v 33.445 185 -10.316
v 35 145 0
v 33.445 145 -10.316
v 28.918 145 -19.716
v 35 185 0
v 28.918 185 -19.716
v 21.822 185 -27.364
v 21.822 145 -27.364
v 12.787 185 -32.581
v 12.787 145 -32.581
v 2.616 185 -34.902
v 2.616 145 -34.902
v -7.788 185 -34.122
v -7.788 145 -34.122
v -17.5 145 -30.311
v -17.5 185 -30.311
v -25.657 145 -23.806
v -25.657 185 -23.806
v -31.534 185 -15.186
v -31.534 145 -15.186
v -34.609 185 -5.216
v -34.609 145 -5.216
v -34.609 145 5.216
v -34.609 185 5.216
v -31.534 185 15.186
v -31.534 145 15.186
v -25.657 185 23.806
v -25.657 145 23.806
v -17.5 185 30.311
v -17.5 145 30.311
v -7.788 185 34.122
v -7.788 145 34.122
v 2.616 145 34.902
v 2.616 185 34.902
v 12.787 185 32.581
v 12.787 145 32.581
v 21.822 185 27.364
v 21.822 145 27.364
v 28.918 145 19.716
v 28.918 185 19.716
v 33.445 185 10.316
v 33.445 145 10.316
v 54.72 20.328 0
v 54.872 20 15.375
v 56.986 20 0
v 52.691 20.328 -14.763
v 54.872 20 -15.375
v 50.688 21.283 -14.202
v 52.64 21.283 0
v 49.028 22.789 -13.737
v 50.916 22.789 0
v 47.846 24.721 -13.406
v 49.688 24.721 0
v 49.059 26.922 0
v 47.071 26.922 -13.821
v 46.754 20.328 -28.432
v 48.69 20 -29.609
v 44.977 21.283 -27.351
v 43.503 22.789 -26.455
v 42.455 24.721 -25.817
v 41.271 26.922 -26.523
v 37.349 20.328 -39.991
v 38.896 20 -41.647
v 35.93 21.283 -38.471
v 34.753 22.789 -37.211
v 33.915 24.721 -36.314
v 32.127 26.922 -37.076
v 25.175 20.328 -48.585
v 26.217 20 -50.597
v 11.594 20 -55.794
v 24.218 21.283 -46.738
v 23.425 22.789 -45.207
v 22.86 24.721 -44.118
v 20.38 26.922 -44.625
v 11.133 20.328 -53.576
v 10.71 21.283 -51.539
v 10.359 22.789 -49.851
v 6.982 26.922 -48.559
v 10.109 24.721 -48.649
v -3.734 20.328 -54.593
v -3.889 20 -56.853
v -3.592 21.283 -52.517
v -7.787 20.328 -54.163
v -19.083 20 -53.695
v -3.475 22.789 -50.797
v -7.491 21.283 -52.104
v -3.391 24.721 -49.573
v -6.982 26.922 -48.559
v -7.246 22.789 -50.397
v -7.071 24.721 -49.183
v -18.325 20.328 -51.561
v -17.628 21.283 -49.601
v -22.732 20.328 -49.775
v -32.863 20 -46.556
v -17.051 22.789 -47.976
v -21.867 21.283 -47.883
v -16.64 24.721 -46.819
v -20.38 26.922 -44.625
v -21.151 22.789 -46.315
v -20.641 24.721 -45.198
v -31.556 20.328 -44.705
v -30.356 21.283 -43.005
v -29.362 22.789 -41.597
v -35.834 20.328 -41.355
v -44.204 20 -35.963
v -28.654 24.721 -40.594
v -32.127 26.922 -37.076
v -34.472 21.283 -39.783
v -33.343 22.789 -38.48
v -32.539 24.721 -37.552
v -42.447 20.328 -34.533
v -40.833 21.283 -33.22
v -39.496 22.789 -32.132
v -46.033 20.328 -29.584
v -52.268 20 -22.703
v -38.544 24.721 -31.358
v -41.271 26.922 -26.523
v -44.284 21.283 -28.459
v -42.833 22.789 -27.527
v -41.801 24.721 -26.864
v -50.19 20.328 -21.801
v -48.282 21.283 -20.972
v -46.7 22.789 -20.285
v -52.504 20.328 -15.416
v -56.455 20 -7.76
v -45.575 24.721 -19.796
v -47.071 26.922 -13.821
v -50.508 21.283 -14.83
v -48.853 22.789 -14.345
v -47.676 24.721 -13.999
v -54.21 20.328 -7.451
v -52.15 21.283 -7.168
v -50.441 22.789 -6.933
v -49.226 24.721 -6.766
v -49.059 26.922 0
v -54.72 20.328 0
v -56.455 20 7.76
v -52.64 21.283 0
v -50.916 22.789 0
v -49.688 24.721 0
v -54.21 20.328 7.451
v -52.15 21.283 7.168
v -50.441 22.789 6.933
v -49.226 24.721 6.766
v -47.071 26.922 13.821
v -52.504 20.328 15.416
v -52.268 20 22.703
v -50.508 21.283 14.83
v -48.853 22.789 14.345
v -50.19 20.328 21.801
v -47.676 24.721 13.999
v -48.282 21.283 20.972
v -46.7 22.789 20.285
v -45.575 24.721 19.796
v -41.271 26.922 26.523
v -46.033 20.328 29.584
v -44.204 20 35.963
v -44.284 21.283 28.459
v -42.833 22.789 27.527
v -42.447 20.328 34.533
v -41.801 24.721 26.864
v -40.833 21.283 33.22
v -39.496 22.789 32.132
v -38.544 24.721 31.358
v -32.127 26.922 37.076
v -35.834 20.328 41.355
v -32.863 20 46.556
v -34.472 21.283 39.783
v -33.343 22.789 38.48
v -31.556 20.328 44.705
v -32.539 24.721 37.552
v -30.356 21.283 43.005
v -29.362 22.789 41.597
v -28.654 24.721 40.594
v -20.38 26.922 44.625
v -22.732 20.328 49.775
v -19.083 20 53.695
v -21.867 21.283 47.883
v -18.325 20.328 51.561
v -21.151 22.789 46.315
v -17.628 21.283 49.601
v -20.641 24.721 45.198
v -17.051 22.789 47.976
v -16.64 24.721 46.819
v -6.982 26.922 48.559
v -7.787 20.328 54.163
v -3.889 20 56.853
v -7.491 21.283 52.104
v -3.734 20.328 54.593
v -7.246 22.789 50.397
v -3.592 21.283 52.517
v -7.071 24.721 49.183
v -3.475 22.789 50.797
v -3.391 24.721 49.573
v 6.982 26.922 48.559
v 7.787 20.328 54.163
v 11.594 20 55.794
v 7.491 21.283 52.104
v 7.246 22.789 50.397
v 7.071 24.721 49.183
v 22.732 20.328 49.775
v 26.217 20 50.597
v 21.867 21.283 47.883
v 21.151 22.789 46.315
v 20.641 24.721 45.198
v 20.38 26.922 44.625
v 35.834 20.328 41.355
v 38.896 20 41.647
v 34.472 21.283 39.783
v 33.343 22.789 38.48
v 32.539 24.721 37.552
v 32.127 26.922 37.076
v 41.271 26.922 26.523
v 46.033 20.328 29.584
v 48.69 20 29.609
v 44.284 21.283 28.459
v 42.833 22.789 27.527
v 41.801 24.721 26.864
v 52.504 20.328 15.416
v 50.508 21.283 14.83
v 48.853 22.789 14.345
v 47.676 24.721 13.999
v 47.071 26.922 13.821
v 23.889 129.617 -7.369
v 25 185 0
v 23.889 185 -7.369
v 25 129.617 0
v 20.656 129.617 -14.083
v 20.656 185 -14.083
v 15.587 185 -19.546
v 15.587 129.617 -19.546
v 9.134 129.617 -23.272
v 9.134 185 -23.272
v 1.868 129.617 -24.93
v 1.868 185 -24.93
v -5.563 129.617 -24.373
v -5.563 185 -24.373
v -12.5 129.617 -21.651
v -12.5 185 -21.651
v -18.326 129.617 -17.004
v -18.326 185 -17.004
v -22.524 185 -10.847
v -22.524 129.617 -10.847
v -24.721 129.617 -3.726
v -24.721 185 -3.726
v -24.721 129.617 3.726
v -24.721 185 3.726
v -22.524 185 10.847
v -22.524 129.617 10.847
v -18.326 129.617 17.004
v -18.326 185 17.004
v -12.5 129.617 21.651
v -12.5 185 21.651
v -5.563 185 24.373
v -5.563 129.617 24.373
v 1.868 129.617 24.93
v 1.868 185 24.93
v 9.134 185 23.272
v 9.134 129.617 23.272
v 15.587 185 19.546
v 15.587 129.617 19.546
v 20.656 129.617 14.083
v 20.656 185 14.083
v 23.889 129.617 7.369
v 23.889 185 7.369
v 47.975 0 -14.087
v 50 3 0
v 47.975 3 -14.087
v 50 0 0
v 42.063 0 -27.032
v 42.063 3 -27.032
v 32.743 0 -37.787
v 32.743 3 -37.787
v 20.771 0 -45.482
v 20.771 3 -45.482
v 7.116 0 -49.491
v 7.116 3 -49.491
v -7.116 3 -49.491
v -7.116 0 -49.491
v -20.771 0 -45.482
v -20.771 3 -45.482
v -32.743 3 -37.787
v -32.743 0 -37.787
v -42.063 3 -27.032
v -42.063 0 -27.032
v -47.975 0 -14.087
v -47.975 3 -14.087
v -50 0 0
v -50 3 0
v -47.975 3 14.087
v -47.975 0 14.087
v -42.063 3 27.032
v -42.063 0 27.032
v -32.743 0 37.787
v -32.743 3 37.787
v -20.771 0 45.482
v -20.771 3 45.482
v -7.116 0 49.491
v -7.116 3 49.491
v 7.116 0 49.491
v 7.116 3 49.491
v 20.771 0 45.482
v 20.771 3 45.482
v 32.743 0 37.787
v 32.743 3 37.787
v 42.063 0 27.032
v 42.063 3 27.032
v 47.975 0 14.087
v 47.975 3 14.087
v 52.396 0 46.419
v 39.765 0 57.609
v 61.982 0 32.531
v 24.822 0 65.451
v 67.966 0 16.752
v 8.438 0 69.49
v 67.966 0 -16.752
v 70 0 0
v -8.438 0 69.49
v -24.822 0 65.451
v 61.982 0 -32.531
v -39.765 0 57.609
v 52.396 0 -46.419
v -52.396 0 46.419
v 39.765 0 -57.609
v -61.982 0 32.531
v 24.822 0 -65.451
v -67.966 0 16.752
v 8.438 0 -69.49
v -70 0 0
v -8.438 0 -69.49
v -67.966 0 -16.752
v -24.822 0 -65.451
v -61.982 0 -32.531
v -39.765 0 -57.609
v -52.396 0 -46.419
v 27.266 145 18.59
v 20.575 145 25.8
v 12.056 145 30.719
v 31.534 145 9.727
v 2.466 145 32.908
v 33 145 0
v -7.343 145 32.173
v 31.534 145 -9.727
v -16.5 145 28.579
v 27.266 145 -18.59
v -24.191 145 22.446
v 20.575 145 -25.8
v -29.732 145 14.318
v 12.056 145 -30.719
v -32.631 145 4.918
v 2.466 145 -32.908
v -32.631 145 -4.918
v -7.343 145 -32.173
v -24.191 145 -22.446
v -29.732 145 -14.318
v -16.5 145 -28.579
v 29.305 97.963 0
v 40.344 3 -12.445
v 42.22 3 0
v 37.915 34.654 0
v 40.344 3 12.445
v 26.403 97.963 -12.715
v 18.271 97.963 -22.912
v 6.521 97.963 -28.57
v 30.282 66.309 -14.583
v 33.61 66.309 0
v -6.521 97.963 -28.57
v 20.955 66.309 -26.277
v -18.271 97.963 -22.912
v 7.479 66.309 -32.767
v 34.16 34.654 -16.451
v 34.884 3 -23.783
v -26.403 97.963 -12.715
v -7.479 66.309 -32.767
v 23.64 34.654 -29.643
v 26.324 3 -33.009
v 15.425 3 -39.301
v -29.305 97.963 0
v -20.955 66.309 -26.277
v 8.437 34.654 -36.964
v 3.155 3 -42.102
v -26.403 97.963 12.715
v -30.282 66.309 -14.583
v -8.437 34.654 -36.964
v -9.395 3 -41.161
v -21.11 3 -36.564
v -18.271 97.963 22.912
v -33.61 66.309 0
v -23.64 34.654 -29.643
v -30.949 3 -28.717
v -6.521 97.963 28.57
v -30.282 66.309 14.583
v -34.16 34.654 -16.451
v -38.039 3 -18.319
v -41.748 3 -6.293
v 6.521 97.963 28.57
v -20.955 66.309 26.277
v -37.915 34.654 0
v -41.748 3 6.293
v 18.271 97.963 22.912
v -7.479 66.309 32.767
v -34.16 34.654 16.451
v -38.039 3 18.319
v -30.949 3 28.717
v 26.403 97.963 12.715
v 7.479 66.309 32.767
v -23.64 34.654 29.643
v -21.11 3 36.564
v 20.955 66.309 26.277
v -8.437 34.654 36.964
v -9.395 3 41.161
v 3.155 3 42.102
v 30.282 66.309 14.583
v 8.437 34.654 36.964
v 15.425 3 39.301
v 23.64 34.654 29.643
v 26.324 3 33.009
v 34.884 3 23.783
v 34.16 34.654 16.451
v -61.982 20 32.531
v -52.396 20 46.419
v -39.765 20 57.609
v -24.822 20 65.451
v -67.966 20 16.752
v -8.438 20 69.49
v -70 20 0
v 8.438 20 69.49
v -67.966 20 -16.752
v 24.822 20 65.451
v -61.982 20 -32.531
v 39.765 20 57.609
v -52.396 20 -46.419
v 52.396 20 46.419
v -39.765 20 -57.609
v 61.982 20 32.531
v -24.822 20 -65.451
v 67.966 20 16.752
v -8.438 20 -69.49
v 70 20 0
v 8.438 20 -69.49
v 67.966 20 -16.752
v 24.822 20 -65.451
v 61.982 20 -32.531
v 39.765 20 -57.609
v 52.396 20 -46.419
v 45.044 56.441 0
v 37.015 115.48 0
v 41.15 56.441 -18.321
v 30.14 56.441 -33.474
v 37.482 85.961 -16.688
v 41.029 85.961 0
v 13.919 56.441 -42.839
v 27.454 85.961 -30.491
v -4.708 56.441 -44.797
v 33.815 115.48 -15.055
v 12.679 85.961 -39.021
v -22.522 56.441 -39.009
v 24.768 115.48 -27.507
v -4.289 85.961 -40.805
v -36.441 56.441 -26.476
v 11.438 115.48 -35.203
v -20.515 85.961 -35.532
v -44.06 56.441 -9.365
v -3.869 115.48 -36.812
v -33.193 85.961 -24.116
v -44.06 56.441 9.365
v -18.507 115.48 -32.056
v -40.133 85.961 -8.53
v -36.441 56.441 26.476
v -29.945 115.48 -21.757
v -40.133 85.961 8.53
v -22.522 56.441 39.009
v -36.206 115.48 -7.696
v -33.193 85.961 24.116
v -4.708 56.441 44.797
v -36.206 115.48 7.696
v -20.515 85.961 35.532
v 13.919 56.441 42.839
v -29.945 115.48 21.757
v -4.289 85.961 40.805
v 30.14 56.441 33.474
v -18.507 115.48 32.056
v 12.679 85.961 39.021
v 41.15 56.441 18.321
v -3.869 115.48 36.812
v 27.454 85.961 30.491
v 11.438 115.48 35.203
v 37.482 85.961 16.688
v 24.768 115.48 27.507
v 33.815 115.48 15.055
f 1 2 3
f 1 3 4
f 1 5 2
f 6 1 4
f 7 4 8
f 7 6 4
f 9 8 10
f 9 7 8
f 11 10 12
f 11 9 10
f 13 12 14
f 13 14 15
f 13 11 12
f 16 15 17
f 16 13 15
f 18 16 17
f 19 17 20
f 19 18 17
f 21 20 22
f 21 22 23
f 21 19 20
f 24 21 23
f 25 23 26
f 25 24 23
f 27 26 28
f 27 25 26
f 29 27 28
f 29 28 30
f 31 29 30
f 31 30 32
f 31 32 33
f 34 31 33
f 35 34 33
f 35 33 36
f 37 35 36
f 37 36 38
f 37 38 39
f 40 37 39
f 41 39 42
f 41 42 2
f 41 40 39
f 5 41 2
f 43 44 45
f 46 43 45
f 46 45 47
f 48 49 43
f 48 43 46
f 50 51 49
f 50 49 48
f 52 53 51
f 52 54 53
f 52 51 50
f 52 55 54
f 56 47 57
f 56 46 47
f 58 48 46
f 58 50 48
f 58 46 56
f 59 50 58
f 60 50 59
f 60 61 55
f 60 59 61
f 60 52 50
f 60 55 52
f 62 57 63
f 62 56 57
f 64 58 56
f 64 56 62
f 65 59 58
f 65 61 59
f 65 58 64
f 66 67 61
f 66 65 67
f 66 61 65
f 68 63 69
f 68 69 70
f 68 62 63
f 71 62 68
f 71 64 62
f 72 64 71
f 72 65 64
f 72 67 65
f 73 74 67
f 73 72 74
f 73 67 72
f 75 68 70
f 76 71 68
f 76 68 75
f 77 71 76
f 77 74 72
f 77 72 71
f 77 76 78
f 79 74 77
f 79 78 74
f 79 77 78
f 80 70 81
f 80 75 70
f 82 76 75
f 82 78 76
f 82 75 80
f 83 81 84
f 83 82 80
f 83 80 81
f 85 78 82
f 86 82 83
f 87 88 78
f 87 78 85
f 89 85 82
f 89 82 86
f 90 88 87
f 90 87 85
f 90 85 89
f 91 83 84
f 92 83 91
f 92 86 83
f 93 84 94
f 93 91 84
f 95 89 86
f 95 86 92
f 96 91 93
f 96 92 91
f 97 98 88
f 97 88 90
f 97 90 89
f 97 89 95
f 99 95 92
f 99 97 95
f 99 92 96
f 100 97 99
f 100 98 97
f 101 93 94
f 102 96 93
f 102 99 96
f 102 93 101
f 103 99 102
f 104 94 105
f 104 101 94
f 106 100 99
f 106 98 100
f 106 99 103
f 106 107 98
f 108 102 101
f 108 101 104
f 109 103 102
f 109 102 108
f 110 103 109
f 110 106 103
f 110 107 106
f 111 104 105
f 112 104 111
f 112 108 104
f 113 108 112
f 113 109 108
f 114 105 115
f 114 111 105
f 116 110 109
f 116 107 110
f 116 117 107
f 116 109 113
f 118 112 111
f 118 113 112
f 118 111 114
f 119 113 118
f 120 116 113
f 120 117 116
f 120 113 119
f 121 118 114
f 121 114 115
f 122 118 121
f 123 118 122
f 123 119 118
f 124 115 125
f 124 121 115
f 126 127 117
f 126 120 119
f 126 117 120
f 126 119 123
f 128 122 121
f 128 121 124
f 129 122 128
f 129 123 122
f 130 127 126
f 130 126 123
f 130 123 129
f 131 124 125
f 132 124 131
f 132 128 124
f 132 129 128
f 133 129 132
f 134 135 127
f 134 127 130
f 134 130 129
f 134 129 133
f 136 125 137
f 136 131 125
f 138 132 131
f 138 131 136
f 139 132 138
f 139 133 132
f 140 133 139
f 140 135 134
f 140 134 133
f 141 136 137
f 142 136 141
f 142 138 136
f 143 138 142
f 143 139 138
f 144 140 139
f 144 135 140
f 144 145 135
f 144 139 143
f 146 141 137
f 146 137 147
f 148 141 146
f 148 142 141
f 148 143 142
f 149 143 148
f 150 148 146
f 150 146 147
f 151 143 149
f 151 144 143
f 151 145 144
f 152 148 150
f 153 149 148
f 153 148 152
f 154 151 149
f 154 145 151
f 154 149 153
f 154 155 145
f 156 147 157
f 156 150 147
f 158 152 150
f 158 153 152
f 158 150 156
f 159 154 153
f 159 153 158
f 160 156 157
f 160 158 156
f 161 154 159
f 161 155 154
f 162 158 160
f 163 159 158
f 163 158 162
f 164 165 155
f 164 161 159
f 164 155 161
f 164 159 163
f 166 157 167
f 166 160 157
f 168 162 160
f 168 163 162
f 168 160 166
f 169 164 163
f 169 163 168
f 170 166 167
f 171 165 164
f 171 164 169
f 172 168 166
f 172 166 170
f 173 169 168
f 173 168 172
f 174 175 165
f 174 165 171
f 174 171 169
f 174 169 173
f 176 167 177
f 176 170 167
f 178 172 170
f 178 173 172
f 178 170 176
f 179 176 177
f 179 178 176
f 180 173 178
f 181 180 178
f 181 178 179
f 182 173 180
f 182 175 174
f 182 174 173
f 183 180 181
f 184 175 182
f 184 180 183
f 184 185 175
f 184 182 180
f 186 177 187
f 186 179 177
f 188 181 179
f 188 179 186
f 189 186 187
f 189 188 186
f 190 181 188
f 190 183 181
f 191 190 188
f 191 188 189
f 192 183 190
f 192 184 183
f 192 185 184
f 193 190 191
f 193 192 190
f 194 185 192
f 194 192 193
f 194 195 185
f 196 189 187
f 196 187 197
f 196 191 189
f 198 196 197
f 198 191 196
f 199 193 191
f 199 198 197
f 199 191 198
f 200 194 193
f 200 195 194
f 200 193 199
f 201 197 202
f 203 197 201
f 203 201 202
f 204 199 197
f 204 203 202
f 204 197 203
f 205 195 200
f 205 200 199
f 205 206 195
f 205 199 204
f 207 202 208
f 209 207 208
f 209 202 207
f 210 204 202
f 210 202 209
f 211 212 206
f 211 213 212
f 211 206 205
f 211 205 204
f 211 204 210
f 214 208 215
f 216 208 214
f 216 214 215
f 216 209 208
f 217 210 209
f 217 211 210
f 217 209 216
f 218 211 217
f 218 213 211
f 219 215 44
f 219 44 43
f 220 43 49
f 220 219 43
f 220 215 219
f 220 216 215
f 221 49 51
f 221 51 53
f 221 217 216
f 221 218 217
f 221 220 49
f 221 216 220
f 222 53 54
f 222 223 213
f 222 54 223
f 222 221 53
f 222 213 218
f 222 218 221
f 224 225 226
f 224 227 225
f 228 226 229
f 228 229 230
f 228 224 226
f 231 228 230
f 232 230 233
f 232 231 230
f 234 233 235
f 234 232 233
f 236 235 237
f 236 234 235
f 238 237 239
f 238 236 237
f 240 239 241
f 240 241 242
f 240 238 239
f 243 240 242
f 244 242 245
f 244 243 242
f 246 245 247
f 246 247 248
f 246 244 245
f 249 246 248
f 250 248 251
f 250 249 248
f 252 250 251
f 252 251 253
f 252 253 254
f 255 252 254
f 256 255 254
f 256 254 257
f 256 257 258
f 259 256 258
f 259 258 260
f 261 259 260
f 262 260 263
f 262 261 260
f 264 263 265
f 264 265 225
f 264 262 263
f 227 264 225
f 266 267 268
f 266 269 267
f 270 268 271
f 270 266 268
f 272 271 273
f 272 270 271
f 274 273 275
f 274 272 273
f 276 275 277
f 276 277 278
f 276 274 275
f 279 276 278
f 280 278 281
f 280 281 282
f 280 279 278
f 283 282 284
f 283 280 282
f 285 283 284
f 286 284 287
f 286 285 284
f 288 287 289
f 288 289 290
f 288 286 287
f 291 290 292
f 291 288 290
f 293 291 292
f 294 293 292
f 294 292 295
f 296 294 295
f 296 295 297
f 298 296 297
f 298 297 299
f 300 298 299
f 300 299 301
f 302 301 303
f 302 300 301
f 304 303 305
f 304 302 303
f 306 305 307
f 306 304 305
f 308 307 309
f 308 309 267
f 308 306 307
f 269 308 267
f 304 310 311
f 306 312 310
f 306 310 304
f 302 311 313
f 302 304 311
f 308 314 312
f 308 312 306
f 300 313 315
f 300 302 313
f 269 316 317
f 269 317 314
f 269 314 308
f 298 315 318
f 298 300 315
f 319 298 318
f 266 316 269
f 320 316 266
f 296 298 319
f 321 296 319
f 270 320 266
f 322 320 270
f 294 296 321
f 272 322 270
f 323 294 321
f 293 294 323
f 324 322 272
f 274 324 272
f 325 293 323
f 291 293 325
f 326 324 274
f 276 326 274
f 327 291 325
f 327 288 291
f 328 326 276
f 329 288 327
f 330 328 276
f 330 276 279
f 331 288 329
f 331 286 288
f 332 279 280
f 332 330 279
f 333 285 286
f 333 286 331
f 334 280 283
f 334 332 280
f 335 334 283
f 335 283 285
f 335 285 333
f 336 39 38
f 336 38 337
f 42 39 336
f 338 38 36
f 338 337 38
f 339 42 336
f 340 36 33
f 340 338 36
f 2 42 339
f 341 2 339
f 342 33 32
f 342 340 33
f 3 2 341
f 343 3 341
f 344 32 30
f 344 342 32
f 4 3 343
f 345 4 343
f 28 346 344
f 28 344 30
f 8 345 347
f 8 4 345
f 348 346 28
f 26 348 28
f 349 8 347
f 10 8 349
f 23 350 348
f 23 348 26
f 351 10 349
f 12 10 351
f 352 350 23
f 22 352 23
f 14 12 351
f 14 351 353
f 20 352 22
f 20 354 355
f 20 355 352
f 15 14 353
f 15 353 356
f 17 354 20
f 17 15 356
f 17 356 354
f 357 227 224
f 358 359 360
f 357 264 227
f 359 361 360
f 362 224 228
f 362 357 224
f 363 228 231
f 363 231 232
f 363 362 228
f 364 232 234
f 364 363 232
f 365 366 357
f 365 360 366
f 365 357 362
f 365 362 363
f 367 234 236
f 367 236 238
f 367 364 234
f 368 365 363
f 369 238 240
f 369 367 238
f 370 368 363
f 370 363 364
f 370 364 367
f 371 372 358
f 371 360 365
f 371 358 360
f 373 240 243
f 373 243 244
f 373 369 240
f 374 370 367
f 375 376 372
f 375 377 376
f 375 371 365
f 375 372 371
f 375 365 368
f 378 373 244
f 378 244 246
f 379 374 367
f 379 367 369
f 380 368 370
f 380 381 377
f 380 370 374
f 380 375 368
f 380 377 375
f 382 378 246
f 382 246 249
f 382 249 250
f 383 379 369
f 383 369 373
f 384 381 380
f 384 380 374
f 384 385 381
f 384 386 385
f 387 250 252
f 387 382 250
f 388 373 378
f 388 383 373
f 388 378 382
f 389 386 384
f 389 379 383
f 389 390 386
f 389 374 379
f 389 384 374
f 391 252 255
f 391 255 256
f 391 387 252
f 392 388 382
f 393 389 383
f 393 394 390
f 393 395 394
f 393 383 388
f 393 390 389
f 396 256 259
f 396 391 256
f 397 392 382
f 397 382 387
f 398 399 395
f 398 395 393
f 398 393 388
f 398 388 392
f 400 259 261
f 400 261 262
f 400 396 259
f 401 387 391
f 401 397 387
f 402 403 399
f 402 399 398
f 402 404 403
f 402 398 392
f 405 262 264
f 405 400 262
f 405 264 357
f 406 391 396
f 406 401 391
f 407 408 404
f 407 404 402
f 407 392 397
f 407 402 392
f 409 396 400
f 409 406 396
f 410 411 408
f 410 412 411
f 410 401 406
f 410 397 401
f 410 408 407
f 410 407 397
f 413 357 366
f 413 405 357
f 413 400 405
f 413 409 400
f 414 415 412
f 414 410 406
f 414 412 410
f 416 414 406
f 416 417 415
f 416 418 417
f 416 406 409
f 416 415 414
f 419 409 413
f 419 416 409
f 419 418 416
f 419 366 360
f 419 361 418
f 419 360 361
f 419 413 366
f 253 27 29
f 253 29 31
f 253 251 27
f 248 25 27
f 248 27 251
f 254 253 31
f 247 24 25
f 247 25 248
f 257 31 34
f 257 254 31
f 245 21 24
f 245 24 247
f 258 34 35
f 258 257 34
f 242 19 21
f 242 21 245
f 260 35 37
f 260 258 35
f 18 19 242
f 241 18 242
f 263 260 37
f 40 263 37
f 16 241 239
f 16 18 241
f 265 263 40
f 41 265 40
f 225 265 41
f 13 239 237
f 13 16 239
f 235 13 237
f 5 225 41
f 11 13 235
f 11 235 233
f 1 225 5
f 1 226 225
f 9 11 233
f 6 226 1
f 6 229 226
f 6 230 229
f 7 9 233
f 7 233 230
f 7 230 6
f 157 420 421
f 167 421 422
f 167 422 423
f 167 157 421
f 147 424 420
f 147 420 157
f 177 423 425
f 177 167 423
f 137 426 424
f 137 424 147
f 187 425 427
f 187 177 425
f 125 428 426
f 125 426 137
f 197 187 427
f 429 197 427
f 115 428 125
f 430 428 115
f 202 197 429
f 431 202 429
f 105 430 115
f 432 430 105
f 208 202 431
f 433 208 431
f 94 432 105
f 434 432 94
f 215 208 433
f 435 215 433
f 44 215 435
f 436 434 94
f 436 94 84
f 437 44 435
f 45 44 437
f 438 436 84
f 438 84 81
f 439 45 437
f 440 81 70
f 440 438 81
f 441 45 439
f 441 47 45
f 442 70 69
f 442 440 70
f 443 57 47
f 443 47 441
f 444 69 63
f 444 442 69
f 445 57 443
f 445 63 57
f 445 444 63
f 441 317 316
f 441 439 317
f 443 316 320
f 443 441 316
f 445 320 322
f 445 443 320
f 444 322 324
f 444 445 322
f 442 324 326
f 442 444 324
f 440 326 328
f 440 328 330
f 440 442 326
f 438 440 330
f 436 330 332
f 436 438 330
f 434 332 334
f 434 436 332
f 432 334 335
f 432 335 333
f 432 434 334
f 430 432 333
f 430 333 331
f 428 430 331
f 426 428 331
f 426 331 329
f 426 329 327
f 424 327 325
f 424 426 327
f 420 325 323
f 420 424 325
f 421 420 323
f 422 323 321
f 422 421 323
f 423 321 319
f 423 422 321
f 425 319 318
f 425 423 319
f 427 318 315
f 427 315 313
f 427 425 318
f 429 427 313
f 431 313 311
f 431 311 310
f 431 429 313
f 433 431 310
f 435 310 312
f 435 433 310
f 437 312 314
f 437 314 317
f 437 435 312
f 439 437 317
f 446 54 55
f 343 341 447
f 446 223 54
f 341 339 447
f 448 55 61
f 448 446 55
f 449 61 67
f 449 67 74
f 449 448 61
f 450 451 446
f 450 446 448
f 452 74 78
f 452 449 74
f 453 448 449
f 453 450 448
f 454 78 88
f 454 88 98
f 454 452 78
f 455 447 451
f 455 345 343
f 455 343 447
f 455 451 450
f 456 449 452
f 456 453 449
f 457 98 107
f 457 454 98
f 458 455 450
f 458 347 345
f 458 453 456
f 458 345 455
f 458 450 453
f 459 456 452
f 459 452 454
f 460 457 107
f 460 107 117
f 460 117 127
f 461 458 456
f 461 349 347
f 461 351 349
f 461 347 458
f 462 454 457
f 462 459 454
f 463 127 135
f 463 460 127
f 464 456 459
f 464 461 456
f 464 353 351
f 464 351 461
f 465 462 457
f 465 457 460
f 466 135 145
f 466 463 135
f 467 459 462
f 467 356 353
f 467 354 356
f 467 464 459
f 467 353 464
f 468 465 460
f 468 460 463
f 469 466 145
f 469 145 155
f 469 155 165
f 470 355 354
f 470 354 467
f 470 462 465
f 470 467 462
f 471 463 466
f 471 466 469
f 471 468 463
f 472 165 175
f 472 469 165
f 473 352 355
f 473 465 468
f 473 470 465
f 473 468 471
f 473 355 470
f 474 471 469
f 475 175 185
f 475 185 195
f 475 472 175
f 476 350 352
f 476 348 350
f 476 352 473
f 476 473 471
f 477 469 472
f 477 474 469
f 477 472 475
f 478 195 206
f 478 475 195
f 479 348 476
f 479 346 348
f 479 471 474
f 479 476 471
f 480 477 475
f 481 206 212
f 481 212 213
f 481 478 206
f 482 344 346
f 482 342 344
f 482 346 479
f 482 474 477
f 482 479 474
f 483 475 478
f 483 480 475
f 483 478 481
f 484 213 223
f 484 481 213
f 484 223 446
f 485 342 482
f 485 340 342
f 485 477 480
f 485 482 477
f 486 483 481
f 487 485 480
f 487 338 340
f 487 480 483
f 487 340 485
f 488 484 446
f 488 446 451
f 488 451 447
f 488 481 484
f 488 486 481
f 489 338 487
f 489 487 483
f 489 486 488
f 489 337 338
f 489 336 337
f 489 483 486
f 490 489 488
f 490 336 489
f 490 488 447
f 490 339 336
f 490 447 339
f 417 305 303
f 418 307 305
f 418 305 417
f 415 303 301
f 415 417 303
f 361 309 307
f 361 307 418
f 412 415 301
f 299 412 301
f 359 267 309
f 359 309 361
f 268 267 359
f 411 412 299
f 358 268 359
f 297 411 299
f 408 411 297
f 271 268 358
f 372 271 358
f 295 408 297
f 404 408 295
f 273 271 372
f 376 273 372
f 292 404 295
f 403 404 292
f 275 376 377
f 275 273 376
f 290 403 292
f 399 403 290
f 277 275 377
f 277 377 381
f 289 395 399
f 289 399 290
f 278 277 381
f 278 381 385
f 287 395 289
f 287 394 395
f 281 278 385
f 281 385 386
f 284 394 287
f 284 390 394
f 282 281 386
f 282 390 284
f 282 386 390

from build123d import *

# Parameters (mm, degrees)
FILLET1_R = 8


with BuildPart() as part:
    # Sketch1 → Revolve1 (revolve)
    with BuildSketch(Plane.XY):
        Polygon((50, 0), (70, 0), (70, 20), (50, 20), (33, 145), (35, 145), (35, 185), (25, 185), (25, 129.61723322), (42.219943718, 3), (50, 3), align=None)
    revolve(axis=Axis((0, 0, 0), (0, 1, 0)))

    # Fillet1
    fillet1_edges = [part.edges().sort_by_distance(p)[0] for p in [
        (-50, 20, 0),
    ]]
    fillet(fillet1_edges, radius=FILLET1_R)


solid = part.part
